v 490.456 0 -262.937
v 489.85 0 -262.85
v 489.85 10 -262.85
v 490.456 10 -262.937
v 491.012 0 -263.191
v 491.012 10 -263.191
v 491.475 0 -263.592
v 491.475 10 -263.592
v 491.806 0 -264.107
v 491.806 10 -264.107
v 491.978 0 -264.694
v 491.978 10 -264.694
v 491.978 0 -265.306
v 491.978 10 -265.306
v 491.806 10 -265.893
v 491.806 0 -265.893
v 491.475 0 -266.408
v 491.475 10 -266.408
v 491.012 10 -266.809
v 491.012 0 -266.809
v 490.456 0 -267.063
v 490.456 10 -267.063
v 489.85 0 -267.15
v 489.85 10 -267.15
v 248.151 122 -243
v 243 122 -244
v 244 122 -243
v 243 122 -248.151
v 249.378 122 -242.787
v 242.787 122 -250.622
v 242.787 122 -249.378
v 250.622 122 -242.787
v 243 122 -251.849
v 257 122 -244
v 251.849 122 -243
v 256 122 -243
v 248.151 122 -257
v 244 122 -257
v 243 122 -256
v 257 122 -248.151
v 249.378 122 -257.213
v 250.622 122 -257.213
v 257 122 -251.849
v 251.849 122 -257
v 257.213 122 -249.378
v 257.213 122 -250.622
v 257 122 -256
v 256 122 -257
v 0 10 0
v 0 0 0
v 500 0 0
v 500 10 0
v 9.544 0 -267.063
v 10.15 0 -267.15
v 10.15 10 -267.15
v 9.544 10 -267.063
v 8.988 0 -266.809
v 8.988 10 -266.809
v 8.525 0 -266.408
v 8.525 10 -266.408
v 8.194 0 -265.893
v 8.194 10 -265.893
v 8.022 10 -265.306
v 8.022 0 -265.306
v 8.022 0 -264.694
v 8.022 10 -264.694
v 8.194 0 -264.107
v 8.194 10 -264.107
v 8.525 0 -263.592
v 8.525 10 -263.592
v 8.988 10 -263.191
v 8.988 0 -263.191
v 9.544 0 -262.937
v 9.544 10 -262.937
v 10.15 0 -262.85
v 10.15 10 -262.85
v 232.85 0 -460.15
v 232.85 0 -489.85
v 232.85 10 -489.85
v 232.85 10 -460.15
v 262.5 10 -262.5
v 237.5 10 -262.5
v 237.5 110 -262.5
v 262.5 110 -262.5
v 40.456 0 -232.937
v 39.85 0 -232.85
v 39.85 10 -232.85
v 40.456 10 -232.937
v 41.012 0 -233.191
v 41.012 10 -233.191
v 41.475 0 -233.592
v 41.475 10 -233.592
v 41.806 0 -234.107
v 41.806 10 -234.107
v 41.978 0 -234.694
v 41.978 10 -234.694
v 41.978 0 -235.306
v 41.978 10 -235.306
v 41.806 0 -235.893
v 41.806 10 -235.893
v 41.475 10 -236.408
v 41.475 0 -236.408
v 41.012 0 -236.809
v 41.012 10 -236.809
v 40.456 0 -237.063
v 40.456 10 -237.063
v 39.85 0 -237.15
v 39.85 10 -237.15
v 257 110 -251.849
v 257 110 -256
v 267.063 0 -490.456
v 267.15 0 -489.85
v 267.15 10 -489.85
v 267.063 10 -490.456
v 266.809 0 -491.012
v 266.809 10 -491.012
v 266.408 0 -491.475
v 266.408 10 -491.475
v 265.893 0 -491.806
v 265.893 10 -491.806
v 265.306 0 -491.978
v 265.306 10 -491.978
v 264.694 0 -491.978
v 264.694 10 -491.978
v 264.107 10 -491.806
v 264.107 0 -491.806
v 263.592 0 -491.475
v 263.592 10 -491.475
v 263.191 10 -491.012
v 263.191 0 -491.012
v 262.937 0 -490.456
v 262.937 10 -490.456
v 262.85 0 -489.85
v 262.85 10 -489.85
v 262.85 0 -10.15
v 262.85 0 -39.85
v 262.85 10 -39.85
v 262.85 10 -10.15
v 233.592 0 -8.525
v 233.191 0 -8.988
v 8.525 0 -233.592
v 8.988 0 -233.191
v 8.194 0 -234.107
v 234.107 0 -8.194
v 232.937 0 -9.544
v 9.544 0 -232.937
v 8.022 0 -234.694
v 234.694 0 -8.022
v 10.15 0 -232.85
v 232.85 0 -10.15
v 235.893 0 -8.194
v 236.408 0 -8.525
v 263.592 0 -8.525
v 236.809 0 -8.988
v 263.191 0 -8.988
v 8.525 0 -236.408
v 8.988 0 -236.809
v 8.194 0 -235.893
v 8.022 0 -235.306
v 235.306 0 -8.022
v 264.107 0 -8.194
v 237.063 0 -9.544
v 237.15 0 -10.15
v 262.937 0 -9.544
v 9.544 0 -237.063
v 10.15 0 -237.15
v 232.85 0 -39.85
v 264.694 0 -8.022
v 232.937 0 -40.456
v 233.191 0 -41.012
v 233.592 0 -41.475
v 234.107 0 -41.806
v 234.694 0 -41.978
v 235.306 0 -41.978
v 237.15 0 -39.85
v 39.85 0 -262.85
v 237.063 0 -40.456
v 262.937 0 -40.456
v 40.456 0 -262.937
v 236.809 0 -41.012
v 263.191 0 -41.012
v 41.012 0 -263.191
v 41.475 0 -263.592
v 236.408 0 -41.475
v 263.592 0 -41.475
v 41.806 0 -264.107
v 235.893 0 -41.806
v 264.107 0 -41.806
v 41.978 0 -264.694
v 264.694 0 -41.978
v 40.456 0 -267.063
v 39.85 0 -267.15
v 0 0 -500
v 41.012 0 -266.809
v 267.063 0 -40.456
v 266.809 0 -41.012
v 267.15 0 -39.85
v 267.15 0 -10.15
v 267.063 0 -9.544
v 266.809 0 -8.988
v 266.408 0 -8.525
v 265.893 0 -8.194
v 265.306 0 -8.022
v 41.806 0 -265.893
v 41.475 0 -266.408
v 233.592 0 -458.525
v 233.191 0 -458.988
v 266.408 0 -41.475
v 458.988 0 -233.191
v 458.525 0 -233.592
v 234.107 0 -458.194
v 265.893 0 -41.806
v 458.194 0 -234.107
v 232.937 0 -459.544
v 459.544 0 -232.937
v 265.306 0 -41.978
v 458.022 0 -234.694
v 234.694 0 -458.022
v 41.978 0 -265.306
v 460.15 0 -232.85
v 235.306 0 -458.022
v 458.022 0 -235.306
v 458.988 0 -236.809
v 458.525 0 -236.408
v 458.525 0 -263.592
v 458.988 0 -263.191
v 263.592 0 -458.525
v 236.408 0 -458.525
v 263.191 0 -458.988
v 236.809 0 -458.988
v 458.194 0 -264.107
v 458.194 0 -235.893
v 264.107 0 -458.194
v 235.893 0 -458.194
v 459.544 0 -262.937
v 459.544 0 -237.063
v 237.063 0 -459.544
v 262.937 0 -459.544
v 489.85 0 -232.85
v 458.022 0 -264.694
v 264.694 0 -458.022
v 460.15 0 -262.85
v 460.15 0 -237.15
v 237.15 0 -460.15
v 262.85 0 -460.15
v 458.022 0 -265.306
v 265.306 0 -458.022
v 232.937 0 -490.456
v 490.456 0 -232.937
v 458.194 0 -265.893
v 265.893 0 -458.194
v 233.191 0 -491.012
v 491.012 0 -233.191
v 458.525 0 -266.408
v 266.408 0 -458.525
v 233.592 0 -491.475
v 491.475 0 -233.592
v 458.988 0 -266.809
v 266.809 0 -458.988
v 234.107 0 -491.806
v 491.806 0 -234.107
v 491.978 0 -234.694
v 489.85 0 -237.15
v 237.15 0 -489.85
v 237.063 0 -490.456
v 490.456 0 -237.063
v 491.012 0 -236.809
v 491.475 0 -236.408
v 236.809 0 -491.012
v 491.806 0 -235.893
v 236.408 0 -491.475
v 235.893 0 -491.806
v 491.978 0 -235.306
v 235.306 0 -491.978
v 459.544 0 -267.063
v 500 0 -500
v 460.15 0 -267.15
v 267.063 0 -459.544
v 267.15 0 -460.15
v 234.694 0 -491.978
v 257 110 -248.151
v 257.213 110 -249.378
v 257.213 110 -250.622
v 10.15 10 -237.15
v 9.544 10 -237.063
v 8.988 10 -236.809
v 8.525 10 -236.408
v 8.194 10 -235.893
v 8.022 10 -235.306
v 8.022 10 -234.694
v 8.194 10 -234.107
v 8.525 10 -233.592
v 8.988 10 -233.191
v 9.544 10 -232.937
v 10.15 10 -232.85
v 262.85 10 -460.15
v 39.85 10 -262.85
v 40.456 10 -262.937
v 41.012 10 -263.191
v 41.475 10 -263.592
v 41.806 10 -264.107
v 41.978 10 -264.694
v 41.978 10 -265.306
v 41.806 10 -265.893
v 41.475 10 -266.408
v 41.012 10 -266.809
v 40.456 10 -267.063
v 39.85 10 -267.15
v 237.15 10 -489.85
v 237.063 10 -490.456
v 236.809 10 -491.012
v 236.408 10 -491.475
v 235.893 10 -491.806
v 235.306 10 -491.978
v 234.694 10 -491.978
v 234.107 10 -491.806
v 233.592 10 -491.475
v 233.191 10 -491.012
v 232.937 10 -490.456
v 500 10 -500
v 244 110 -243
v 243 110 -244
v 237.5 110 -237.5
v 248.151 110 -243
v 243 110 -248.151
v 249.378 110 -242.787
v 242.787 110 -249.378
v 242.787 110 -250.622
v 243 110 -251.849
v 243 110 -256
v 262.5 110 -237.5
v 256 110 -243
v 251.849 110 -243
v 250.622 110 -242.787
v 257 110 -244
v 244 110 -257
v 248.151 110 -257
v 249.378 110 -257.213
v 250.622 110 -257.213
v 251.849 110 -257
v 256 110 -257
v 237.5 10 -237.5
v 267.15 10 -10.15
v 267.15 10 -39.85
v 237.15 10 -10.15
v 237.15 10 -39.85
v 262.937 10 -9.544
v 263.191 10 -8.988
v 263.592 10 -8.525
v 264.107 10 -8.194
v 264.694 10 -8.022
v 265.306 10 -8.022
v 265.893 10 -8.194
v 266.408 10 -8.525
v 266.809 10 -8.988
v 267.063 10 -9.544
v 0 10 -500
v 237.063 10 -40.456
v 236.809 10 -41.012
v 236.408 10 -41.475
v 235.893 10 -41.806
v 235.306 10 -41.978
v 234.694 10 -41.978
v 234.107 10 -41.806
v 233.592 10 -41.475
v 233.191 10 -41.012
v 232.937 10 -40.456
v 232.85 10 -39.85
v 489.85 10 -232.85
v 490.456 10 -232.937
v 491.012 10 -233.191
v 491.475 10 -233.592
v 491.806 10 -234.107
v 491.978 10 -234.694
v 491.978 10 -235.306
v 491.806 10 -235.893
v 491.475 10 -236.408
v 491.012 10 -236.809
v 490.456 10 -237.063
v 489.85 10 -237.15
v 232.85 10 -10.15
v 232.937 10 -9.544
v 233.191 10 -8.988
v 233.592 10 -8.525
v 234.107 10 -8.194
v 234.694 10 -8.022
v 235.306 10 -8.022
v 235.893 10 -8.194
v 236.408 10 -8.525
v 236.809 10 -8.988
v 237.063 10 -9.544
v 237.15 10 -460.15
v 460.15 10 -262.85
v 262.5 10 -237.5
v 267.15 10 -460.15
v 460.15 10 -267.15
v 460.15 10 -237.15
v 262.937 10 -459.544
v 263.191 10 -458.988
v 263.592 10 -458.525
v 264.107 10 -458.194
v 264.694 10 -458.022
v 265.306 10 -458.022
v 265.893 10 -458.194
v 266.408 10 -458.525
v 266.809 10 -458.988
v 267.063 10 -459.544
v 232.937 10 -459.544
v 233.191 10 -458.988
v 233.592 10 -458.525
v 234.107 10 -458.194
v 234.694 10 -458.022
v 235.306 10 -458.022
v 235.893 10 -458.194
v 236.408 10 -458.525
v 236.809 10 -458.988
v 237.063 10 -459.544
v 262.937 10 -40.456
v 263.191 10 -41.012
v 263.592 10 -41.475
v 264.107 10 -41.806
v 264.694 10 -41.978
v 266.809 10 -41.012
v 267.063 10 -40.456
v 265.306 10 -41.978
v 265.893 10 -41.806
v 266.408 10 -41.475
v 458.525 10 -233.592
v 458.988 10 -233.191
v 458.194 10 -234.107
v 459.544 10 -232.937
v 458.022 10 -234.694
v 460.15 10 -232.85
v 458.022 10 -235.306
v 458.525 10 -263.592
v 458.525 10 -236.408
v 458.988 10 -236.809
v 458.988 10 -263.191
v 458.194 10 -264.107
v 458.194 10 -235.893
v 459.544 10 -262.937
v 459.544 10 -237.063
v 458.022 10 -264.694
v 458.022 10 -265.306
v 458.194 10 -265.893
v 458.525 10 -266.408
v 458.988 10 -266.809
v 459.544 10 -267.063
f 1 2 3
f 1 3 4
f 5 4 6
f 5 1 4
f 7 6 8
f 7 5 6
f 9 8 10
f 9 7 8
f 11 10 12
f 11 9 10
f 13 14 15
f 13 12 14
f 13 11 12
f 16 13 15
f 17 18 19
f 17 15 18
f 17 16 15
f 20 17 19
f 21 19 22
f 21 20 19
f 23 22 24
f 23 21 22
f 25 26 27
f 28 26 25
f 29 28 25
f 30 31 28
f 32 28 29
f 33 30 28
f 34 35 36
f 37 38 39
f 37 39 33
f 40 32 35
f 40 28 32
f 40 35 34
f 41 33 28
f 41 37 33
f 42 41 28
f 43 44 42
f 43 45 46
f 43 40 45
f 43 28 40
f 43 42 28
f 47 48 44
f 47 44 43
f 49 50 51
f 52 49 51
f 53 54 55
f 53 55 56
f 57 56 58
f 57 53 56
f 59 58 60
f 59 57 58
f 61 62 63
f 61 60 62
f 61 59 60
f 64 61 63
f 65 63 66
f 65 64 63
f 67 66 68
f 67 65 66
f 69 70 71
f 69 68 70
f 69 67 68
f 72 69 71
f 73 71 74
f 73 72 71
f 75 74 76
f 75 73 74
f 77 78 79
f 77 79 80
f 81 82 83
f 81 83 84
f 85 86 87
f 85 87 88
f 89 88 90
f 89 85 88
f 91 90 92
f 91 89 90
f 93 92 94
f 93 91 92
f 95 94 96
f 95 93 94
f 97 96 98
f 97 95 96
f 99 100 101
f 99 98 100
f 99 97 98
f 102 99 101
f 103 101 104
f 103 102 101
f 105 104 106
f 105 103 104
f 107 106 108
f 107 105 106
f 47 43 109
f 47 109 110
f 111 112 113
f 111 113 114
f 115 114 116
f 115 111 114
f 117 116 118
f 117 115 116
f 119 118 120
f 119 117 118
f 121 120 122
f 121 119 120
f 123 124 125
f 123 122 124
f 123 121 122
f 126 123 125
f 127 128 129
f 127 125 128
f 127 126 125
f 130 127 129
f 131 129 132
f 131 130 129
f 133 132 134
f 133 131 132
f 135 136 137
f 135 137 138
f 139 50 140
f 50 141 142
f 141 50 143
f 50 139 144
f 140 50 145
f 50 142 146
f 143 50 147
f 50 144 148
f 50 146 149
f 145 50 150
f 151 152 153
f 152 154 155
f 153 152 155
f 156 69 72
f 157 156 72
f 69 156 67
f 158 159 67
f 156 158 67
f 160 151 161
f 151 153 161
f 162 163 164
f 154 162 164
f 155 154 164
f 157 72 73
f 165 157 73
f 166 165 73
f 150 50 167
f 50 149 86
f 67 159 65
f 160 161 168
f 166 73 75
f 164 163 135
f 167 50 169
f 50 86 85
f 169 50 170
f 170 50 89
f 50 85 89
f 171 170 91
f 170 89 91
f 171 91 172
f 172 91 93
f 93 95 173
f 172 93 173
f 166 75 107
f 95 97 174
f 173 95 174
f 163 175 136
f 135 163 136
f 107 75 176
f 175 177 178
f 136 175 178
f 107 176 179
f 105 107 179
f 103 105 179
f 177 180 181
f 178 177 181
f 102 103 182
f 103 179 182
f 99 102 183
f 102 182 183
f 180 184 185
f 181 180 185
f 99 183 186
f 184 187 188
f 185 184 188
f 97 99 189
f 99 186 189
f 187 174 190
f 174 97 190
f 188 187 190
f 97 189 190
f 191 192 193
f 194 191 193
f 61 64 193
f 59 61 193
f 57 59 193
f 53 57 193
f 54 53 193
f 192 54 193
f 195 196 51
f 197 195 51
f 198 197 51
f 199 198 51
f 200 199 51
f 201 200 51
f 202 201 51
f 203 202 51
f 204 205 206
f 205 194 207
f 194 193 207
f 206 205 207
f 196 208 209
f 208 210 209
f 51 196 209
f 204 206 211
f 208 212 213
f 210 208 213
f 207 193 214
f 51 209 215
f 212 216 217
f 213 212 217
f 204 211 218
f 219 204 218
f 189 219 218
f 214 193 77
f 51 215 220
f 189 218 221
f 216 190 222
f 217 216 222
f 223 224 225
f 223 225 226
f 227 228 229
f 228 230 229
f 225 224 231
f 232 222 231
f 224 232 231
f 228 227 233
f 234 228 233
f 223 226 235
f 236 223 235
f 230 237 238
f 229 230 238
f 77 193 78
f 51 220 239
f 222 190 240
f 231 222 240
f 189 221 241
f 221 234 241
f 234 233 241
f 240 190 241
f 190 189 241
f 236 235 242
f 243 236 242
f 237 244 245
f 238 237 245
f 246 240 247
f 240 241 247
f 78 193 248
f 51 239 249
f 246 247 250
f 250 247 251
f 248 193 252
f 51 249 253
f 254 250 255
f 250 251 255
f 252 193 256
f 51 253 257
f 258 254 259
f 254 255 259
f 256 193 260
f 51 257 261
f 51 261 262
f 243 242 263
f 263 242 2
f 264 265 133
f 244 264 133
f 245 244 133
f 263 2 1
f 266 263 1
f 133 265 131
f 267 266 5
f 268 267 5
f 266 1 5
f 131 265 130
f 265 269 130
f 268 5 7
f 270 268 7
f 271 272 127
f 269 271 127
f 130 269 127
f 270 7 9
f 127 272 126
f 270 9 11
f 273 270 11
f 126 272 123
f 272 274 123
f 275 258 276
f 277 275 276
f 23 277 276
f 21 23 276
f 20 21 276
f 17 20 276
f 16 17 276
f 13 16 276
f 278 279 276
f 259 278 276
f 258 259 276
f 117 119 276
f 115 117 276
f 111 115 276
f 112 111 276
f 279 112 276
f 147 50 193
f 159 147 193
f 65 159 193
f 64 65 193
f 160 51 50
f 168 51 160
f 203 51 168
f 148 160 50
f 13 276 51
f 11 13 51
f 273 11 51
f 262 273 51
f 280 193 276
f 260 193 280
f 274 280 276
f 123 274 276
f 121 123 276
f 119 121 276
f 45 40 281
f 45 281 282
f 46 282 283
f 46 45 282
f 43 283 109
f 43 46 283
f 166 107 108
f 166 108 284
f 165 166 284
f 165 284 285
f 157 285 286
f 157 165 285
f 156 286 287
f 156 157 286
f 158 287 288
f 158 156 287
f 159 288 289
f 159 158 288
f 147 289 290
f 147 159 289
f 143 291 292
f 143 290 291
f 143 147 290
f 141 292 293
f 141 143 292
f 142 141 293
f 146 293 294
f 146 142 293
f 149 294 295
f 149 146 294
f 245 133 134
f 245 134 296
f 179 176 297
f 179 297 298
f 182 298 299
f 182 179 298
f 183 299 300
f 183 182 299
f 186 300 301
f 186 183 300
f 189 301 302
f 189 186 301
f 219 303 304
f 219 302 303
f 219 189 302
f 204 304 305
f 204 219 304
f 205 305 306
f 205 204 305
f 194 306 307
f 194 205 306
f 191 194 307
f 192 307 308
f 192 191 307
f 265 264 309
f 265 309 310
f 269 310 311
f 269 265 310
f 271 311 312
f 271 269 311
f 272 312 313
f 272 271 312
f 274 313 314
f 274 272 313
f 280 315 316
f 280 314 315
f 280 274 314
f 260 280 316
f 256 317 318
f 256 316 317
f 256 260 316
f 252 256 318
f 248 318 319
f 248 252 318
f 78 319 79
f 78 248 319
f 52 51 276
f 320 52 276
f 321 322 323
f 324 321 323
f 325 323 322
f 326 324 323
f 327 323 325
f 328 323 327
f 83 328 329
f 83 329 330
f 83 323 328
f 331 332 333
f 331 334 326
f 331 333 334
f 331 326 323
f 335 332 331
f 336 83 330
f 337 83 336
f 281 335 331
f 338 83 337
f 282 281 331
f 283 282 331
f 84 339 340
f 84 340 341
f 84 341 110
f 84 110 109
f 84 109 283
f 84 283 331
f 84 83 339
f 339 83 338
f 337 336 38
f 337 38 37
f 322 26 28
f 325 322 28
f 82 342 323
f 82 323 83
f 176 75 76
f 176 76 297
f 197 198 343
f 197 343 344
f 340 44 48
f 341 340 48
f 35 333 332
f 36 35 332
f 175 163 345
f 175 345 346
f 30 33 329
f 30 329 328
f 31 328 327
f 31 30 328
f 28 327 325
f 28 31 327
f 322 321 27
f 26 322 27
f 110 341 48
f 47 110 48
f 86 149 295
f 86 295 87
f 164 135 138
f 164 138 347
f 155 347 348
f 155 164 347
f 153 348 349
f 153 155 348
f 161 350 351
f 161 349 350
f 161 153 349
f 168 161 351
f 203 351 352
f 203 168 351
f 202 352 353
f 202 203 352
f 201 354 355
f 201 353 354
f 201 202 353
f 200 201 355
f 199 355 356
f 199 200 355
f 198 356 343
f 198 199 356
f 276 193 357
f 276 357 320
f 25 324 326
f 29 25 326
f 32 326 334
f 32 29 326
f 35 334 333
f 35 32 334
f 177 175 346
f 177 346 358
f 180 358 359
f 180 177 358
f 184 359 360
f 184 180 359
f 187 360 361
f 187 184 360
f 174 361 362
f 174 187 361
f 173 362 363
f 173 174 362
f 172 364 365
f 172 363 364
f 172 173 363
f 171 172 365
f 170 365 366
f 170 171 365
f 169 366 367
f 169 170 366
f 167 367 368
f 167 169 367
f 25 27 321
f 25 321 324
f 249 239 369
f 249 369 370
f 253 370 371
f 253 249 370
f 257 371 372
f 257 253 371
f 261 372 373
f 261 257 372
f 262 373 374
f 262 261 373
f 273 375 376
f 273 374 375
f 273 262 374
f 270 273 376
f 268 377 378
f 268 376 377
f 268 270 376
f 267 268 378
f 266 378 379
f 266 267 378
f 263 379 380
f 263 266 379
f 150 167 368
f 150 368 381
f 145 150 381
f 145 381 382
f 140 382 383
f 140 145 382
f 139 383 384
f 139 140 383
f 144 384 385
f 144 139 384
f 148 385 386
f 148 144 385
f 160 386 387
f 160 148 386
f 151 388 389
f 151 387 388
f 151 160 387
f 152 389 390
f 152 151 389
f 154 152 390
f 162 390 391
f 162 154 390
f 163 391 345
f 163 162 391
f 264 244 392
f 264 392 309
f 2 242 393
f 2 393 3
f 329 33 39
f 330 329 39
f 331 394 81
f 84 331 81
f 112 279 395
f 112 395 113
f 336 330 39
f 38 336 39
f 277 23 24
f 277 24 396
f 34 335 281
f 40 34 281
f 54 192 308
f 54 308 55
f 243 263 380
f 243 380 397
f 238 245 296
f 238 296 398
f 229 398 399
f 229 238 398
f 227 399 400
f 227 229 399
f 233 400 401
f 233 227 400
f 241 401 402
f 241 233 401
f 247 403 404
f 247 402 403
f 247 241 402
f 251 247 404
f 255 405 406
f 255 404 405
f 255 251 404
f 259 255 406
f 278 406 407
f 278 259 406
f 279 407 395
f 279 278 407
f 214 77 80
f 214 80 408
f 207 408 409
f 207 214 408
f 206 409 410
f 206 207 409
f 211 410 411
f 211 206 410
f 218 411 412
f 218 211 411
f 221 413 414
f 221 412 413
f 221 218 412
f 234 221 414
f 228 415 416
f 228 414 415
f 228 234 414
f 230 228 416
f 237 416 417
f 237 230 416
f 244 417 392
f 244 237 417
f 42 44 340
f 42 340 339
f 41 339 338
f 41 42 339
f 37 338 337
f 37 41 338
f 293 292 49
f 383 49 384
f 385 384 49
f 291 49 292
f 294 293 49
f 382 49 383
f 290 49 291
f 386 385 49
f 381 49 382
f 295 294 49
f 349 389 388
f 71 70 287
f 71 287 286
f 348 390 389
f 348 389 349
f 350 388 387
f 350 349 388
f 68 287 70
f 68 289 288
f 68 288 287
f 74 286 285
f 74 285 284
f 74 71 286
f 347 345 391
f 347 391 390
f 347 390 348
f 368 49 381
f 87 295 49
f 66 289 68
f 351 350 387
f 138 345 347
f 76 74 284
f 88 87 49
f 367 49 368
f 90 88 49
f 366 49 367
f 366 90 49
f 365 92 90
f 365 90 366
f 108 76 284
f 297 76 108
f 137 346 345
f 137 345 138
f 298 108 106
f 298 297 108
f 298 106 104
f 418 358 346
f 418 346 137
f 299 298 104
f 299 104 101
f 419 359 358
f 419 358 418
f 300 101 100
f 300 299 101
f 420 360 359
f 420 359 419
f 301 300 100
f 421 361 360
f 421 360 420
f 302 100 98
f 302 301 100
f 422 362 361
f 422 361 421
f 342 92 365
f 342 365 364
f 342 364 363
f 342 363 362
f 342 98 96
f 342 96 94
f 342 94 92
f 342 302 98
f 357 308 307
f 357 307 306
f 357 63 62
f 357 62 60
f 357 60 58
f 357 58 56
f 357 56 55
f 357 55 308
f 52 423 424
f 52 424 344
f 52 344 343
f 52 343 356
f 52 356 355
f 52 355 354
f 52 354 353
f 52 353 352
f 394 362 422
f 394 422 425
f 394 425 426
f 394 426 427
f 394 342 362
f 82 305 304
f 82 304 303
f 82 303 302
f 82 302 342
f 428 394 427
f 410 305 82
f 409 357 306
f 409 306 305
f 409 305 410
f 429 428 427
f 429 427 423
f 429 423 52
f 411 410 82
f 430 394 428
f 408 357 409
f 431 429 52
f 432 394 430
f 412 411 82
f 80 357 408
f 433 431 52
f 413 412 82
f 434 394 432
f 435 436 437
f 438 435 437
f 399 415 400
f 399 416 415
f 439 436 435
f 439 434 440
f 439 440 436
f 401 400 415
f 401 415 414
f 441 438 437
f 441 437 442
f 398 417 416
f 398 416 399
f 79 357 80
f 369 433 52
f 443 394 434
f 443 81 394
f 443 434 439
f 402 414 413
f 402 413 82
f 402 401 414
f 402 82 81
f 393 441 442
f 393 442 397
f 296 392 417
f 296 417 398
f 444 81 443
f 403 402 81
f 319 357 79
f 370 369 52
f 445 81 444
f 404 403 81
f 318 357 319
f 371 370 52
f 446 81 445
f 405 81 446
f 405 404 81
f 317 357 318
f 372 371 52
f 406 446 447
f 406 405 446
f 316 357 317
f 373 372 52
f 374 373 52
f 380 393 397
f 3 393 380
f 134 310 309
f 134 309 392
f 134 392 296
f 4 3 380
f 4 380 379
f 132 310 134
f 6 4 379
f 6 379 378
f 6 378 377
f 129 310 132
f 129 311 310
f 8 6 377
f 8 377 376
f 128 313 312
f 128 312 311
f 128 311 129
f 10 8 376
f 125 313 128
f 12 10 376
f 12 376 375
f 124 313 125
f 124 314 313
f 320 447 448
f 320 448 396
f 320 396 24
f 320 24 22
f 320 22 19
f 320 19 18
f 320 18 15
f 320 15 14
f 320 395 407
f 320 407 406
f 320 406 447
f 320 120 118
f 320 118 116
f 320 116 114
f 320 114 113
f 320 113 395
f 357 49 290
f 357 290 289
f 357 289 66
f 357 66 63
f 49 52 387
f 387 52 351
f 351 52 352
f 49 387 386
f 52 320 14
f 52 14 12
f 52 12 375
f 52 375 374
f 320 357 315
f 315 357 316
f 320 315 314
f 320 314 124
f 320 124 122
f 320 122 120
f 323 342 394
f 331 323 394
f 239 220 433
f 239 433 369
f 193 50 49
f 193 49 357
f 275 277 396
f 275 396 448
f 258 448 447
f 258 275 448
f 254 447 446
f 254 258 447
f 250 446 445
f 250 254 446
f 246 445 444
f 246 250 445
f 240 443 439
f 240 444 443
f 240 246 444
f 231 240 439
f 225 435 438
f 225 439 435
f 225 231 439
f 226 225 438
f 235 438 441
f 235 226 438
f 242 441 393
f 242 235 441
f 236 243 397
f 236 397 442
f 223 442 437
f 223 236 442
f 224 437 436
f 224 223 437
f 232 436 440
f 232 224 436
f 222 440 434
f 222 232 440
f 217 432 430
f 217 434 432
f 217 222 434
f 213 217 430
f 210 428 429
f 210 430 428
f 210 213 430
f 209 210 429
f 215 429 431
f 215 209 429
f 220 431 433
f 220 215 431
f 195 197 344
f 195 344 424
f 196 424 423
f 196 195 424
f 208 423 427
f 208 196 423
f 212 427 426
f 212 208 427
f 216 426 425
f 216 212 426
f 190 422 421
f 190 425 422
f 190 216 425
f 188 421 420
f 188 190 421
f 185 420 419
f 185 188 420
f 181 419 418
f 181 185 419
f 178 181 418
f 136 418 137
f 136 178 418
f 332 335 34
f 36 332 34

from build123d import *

# Parameters (mm, degrees)
ESBO_O1_W                  = 500
ESBO_O1_H                  = 500
RESSALTO_EXTRUS_O1_DEPTH   = 10
CORTE_EXTRUS_O2_DEPTH      = 708.177488329
CORTE_EXTRUS_O2_DEPTH_BACK = 708.177488329
ESBO_O3_W                  = 25
ESBO_O3_H                  = 25
RESSALTO_EXTRUS_O2_DEPTH   = 100
ESBO_O4_W                  = 14
ESBO_O4_H                  = 14
RESSALTO_EXTRUS_O3_DEPTH   = 12
ESBO_O5_R                  = 7.24
RESSALTO_EXTRUS_O4_DEPTH   = 12
CHANFRO1_SIZE              = 1


with BuildPart() as part:
    # Esboço1 → Ressalto-extrusão1 (new body)
    with BuildSketch(Plane(origin=(0, 0, 0), x_dir=(1, 0, 0), z_dir=(0, 1, 0))):
        with Locations((250, 250)):
            Rectangle(ESBO_O1_W, ESBO_O1_H)
    extrude(amount=RESSALTO_EXTRUS_O1_DEPTH)

    # Esboço2 → Corte-extrusão2 (cut, two sides: drawn at the far end of the back side and taken through both)
    with BuildSketch(Plane(origin=(0, 10, 0), x_dir=(1, 0, 0), z_dir=(0, 1, 0)).offset(-CORTE_EXTRUS_O2_DEPTH_BACK)):
        with BuildLine():
            Line((232.85, 489.85), (232.85, 460.15))
            ThreePointArc((232.85, 460.15), (235, 458), (237.15, 460.15))
            Line((237.15, 460.15), (237.15, 489.85))
            ThreePointArc((237.15, 489.85), (235, 492), (232.85, 489.85))
        make_face()
        with BuildLine():
            Line((262.85, 489.85), (262.85, 460.15))
            ThreePointArc((262.85, 460.15), (265, 458), (267.15, 460.15))
            Line((267.15, 460.15), (267.15, 489.85))
            ThreePointArc((267.15, 489.85), (265, 492), (262.85, 489.85))
        make_face()
        with BuildLine():
            Line((489.85, 267.15), (460.15, 267.15))
            ThreePointArc((460.15, 267.15), (458, 265), (460.15, 262.85))
            Line((460.15, 262.85), (489.85, 262.85))
            ThreePointArc((489.85, 262.85), (492, 265), (489.85, 267.15))
        make_face()
        with BuildLine():
            Line((489.85, 237.15), (460.15, 237.15))
            ThreePointArc((460.15, 237.15), (458, 235), (460.15, 232.85))
            Line((460.15, 232.85), (489.85, 232.85))
            ThreePointArc((489.85, 232.85), (492, 235), (489.85, 237.15))
        make_face()
        with BuildLine():
            Line((267.15, 10.15), (267.15, 39.85))
            ThreePointArc((267.15, 39.85), (265, 42), (262.85, 39.85))
            Line((262.85, 39.85), (262.85, 10.15))
            ThreePointArc((262.85, 10.15), (265, 8), (267.15, 10.15))
        make_face()
        with BuildLine():
            Line((237.15, 10.15), (237.15, 39.85))
            ThreePointArc((237.15, 39.85), (235, 42), (232.85, 39.85))
            Line((232.85, 39.85), (232.85, 10.15))
            ThreePointArc((232.85, 10.15), (235, 8), (237.15, 10.15))
        make_face()
        with BuildLine():
            Line((10.15, 232.85), (39.85, 232.85))
            ThreePointArc((39.85, 232.85), (42, 235), (39.85, 237.15))
            Line((39.85, 237.15), (10.15, 237.15))
            ThreePointArc((10.15, 237.15), (8, 235), (10.15, 232.85))
        make_face()
        with BuildLine():
            Line((10.15, 262.85), (39.85, 262.85))
            ThreePointArc((39.85, 262.85), (42, 265), (39.85, 267.15))
            Line((39.85, 267.15), (10.15, 267.15))
            ThreePointArc((10.15, 267.15), (8, 265), (10.15, 262.85))
        make_face()
    extrude(amount=CORTE_EXTRUS_O2_DEPTH + CORTE_EXTRUS_O2_DEPTH_BACK, mode=Mode.SUBTRACT)

    # Esboço3 → Ressalto-extrusão2 (add)
    with BuildSketch(Plane(origin=(0, 10, 0), x_dir=(1, 0, 0), z_dir=(0, 1, 0))):
        with Locations((250, 250)):
            Rectangle(ESBO_O3_W, ESBO_O3_H)
    extrude(amount=RESSALTO_EXTRUS_O2_DEPTH)

    # Esboço4 → Ressalto-extrusão3 (add)
    with BuildSketch(Plane(origin=(0, 110, 0), x_dir=(1, 0, 0), z_dir=(0, 1, 0))):
        with Locations((250, 250)):
            Rectangle(ESBO_O4_W, ESBO_O4_H)
    extrude(amount=RESSALTO_EXTRUS_O3_DEPTH)

    # Esboço5 → Ressalto-extrusão4 (add)
    with BuildSketch(Plane(origin=(0, 122, 0), x_dir=(1, 0, 0), z_dir=(0, 1, 0))):
        with Locations((250, 250)):
            Circle(ESBO_O5_R)
    extrude(amount=-RESSALTO_EXTRUS_O4_DEPTH)

    # Chanfro1
    chanfro1_edges = [part.edges().sort_by_distance(p)[0] for p in [
        (243, 116, -257),
        (243, 116, -243),
        (257, 116, -243),
        (257, 116, -257),
    ]]
    chamfer(chanfro1_edges, length=CHANFRO1_SIZE)


solid = part.part
